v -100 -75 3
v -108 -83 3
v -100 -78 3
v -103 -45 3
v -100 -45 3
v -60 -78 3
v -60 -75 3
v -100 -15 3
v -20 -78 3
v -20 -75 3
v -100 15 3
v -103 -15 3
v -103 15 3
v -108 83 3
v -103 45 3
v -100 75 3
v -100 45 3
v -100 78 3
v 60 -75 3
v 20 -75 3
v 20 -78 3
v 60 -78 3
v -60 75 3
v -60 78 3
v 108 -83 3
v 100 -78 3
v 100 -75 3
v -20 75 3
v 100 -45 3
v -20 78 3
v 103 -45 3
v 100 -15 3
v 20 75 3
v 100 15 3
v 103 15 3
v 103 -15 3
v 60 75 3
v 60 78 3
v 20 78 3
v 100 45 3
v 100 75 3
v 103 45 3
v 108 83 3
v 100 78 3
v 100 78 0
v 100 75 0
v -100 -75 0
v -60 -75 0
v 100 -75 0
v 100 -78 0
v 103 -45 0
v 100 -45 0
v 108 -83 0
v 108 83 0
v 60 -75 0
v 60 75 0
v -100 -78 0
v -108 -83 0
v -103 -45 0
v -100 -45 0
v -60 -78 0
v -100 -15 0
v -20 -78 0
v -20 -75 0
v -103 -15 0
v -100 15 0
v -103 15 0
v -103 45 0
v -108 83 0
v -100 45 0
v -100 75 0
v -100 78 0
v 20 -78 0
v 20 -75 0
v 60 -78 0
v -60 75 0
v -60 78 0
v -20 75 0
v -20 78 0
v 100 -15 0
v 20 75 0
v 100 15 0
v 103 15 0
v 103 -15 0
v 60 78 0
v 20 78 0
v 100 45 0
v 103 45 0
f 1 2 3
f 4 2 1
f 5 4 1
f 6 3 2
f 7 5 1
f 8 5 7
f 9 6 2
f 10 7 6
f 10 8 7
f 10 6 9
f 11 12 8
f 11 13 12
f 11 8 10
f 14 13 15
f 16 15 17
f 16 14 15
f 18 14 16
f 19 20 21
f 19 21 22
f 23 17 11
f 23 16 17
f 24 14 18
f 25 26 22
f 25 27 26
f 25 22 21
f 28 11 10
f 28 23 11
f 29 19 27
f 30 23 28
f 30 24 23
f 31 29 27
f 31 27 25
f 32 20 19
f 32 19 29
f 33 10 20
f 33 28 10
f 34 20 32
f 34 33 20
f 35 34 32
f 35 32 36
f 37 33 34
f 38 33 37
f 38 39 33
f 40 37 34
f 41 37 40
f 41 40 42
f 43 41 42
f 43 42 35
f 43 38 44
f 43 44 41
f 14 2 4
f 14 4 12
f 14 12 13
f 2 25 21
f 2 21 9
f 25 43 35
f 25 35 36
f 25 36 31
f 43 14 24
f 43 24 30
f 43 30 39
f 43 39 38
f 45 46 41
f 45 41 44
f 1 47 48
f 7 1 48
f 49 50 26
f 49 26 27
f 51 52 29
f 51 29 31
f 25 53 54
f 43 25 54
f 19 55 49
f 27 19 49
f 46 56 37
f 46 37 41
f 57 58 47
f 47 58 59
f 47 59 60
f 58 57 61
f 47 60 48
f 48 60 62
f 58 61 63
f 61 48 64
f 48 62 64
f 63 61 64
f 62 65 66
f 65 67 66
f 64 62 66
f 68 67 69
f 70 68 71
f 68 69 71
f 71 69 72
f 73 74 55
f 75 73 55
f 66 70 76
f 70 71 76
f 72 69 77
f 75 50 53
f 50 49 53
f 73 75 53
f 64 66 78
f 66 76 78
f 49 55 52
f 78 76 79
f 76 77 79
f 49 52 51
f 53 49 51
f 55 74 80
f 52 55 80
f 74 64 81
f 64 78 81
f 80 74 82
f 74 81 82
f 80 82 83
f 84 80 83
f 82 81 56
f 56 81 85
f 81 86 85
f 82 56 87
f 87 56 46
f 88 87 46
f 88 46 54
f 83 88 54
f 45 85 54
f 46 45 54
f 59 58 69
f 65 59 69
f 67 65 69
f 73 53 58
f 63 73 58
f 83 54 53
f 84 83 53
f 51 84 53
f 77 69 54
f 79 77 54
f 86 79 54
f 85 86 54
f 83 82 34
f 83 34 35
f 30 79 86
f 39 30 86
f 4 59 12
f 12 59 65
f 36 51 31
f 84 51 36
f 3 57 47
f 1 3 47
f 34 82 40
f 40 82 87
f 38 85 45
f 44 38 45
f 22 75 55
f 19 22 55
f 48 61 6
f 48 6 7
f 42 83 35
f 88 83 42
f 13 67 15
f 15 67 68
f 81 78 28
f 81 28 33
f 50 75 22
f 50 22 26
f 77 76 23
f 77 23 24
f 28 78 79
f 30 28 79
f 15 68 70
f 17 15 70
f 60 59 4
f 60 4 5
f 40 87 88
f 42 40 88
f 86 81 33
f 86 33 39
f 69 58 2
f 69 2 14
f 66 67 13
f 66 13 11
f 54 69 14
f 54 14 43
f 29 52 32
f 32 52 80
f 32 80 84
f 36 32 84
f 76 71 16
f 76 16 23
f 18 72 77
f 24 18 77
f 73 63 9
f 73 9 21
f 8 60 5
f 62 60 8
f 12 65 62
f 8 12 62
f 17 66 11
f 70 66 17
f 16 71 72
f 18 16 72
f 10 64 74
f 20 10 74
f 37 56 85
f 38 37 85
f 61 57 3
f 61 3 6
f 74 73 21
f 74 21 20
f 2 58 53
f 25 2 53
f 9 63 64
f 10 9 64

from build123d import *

# Parameters (mm, degrees)
SKETCH1_W           = 216
SKETCH1_H           = 166
SKETCH1_W_2         = 40
SKETCH1_H_2         = 3
SKETCH1_W_3         = 3
SKETCH1_H_3         = 30
BOSS_EXTRUDE1_DEPTH = 3


with BuildPart() as part:
    # Sketch1 → Boss-Extrude1 (new body)
    with BuildSketch(Plane.XY):
        Rectangle(SKETCH1_W, SKETCH1_H)
        with Locations((-80, 76.5)):
            Rectangle(SKETCH1_W_2, SKETCH1_H_2, mode=Mode.SUBTRACT)
        with Locations((80, 76.5)):
            Rectangle(SKETCH1_W_2, SKETCH1_H_2, mode=Mode.SUBTRACT)
        with Locations((101.5, 30)):
            Rectangle(SKETCH1_W_3, SKETCH1_H_3, mode=Mode.SUBTRACT)
        with Locations((80, -76.5)):
            Rectangle(SKETCH1_W_2, SKETCH1_H_2, mode=Mode.SUBTRACT)
        with Locations((-101.5, 30)):
            Rectangle(SKETCH1_W_3, SKETCH1_H_3, mode=Mode.SUBTRACT)
        with Locations((0, 76.5)):
            Rectangle(SKETCH1_W_2, SKETCH1_H_2, mode=Mode.SUBTRACT)
        with Locations((101.5, -30)):
            Rectangle(SKETCH1_W_3, SKETCH1_H_3, mode=Mode.SUBTRACT)
        with Locations((0, -76.5)):
            Rectangle(SKETCH1_W_2, SKETCH1_H_2, mode=Mode.SUBTRACT)
        with Locations((-80, -76.5)):
            Rectangle(SKETCH1_W_2, SKETCH1_H_2, mode=Mode.SUBTRACT)
        with Locations((-101.5, -30)):
            Rectangle(SKETCH1_W_3, SKETCH1_H_3, mode=Mode.SUBTRACT)
    extrude(amount=BOSS_EXTRUDE1_DEPTH)


solid = part.part
